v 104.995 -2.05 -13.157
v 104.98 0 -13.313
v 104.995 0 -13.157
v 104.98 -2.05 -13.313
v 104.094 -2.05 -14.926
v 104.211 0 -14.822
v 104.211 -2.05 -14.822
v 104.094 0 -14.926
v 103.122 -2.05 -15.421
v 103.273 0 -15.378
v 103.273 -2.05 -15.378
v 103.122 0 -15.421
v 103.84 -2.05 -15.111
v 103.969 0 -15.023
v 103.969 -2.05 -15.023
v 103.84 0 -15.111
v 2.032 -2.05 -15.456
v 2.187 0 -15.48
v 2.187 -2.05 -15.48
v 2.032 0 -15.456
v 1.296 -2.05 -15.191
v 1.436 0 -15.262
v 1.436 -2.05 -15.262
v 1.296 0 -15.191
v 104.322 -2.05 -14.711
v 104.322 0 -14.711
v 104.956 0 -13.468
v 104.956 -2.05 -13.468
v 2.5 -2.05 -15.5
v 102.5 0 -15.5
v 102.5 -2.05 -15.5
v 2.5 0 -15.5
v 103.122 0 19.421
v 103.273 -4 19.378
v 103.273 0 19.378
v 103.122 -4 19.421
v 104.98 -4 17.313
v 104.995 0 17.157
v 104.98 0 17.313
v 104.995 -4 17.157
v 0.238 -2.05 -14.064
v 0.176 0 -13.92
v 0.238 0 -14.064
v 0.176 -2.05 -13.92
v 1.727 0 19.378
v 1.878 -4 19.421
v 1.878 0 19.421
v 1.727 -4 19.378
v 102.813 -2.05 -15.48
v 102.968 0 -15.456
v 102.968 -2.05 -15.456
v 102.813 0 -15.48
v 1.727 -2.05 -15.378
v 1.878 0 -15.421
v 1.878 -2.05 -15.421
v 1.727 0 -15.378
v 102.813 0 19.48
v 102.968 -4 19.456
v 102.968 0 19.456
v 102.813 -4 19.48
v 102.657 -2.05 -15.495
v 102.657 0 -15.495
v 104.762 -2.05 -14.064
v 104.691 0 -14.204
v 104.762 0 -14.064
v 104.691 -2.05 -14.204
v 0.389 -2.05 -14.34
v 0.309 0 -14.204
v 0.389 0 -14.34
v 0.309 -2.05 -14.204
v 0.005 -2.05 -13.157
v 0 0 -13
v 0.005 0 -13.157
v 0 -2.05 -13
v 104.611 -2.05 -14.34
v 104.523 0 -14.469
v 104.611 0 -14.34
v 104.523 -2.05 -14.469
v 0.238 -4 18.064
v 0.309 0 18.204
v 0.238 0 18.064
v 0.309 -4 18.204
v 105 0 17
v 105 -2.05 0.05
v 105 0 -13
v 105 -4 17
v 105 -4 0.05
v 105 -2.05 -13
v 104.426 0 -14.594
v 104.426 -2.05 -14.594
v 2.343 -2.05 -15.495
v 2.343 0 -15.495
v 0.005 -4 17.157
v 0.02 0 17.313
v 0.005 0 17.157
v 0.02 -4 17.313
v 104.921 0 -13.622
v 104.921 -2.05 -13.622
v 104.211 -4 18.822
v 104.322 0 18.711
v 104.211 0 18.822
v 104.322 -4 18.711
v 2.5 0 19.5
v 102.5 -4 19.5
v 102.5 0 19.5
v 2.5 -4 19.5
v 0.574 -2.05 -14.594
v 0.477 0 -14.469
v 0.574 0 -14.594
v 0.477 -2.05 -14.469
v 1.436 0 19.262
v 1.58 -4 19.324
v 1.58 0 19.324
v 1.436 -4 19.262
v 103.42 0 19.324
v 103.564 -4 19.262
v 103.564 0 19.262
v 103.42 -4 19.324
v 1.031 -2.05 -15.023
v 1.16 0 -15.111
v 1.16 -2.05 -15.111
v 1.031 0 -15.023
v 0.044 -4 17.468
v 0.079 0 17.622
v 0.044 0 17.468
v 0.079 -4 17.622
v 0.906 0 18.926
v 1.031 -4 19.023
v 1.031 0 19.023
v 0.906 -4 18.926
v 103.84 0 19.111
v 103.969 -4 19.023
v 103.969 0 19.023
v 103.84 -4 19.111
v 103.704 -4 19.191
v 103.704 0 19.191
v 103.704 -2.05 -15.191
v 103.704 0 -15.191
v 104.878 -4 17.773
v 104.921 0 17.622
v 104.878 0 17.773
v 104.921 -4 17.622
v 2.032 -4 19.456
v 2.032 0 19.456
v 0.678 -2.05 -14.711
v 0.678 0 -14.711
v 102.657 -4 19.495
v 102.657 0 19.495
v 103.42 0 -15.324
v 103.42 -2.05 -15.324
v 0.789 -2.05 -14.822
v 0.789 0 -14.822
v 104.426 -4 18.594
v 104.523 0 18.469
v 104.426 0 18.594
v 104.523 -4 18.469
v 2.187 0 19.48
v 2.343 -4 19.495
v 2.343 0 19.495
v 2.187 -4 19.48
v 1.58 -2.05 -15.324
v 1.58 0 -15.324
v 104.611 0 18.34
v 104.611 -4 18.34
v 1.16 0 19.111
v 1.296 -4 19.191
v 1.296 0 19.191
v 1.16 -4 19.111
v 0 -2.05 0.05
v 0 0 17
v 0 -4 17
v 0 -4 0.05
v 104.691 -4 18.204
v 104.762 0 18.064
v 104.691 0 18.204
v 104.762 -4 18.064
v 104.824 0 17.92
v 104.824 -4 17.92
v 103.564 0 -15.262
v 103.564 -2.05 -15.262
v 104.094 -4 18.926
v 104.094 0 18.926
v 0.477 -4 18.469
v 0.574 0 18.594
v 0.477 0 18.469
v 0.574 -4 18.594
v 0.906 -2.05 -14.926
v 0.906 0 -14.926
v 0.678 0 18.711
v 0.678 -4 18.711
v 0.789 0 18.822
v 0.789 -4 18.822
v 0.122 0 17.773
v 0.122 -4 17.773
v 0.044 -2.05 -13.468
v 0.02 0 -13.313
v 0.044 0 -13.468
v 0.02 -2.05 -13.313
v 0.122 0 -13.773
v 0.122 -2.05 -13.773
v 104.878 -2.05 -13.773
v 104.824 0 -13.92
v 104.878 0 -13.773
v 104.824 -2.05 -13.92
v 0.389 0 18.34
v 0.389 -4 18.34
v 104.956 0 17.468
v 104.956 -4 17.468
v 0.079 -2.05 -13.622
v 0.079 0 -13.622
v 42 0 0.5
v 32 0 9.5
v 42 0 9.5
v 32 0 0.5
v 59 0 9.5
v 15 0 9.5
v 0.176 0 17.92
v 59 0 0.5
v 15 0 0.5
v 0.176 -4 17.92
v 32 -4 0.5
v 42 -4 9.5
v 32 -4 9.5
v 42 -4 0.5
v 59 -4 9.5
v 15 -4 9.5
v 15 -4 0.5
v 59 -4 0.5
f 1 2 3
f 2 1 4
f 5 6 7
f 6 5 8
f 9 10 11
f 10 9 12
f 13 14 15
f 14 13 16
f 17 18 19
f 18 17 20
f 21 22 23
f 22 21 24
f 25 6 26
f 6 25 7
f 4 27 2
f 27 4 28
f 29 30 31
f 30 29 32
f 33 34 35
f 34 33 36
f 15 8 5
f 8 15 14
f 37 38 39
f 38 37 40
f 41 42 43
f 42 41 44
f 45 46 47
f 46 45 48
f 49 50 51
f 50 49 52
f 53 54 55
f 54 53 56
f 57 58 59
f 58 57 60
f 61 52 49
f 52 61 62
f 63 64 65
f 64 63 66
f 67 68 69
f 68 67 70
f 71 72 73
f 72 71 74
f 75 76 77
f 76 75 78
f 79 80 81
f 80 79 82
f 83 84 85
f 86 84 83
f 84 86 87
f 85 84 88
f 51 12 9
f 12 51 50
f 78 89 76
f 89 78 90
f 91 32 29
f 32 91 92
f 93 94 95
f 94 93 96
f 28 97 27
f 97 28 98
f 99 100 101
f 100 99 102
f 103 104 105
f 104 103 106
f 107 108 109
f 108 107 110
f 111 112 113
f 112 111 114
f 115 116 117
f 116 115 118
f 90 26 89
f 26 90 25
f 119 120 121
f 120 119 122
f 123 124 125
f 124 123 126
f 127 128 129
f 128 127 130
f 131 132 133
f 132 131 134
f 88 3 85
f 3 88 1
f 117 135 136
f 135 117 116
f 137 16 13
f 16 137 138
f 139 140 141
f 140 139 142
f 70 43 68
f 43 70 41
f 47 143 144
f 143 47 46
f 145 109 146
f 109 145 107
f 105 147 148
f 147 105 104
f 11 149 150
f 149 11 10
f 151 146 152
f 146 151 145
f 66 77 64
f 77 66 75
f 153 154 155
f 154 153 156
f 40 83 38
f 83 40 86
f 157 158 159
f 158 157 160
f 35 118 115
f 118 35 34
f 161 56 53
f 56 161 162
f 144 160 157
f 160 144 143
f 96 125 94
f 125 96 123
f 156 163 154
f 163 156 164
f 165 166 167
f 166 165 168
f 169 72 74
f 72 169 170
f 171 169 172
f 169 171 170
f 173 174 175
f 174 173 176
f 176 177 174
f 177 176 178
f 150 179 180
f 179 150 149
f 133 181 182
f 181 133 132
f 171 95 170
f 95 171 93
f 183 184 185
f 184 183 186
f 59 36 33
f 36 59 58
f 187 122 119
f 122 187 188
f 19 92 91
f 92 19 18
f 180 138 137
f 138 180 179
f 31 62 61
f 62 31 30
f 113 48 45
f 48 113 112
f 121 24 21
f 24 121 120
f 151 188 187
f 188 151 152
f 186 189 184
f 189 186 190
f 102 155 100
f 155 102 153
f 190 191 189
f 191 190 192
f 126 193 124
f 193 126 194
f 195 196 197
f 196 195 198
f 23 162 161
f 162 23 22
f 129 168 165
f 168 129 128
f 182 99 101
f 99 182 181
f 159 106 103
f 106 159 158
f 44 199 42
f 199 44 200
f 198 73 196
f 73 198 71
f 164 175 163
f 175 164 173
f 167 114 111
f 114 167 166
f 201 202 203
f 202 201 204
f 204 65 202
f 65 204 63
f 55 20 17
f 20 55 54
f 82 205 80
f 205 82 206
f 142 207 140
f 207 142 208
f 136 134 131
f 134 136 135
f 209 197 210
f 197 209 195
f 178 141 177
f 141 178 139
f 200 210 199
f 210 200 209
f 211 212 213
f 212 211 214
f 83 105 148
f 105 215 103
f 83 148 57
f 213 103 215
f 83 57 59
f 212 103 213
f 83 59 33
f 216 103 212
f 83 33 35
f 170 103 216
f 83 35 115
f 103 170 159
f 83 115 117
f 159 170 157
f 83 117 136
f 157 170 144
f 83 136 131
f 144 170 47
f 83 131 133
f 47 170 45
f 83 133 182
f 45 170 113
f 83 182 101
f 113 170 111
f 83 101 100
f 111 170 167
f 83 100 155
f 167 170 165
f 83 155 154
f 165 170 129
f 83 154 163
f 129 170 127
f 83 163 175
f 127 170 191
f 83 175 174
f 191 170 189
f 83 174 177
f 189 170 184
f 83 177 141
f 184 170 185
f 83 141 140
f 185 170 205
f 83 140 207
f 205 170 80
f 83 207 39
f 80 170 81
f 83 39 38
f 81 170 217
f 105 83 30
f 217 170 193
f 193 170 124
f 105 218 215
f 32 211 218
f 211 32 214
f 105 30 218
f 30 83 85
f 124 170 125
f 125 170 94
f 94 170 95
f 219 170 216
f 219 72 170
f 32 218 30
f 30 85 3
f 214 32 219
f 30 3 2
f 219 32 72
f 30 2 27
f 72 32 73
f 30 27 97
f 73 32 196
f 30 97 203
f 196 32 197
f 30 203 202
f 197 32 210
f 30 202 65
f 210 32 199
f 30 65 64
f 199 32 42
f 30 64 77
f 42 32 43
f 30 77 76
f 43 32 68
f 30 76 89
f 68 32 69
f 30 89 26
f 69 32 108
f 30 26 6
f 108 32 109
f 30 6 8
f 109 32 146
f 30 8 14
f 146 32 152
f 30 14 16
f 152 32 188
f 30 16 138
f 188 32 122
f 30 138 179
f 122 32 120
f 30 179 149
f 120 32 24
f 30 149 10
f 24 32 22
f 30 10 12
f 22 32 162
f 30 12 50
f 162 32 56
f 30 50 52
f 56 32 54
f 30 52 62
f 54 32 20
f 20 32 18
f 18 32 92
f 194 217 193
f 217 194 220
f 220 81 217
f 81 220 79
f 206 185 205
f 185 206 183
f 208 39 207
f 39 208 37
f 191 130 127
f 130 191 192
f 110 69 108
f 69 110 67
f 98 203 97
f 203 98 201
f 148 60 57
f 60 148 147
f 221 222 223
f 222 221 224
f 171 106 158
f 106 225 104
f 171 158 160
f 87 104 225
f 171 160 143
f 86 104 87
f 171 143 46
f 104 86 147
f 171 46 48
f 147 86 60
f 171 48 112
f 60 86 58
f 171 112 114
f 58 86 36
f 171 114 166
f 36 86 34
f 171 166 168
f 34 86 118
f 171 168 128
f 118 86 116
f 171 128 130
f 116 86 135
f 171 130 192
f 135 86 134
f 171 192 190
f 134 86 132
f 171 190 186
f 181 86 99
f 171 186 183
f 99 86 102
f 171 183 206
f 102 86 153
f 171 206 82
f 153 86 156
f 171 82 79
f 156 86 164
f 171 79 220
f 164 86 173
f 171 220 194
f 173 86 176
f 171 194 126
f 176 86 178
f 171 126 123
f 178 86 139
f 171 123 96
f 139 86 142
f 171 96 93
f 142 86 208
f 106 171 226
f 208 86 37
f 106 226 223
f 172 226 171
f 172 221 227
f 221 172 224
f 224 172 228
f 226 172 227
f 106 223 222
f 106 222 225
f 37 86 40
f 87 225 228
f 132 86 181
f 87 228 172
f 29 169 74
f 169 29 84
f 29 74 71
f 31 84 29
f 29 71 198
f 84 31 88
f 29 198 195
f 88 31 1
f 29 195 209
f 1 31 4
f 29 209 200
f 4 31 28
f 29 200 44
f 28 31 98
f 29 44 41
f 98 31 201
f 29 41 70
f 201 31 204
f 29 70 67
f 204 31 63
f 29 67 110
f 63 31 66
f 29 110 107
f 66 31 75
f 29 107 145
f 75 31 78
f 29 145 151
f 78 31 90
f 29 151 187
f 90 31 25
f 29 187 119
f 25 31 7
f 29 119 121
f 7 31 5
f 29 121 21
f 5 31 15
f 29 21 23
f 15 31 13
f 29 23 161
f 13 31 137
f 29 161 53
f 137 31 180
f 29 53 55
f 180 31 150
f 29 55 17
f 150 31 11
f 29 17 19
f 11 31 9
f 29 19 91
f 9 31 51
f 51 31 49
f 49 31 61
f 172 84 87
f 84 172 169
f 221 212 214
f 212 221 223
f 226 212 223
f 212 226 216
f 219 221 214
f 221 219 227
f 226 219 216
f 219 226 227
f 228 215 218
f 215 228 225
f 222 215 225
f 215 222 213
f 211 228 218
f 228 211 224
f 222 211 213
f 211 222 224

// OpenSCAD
$fn=100;
eps = 0.01;

d = 5;
base_h = 4;
cut_h = 2;
l = 100;
cut_a = 18;
base_a = 30;

module
    mantinel(d=d,base_h=base_h,cut_h=cut_h,l=l,cut_a=cut_a,base_a=base_a)
{
    difference()
    {
        hull()
        {
            cylinder(d=d,h=base_h);
            translate([l,0,0]) cylinder(d=d,h=base_h);
            translate([l,base_a,0]) cylinder(d=d,h=base_h);
            translate([0,base_a,0]) cylinder(d=d,h=base_h);           
        }
        translate([-d-0.05,-d-0.05,base_h-cut_h+0.05])
            cube([2*d+l+0.1,cut_a+0.1,cut_h]);
    }
}

//mantinel();

module USB_mantinel()
{
    usb_xo = 15;
    usb_yo = base_h + eps;
    usb_zo = 0.5;
    
    usb_x = 17;
    usb_y = base_h+2*eps;
    usb_z = 9;
    
    usb_off= 10;
    
    x_leveling = d/2;
    z_leveling = cut_a-d;
    difference()
    {
        translate([d/2,0,-z_leveling]) rotate([90,0,0])
            mantinel();
        translate([usb_xo,-usb_yo,usb_zo])
            cube([usb_x,usb_y, usb_z]);
        translate([usb_xo+usb_off+usb_x,-usb_yo,usb_zo])
            cube([usb_x,usb_y, usb_z]);
        
    }
}

USB_mantinel();
